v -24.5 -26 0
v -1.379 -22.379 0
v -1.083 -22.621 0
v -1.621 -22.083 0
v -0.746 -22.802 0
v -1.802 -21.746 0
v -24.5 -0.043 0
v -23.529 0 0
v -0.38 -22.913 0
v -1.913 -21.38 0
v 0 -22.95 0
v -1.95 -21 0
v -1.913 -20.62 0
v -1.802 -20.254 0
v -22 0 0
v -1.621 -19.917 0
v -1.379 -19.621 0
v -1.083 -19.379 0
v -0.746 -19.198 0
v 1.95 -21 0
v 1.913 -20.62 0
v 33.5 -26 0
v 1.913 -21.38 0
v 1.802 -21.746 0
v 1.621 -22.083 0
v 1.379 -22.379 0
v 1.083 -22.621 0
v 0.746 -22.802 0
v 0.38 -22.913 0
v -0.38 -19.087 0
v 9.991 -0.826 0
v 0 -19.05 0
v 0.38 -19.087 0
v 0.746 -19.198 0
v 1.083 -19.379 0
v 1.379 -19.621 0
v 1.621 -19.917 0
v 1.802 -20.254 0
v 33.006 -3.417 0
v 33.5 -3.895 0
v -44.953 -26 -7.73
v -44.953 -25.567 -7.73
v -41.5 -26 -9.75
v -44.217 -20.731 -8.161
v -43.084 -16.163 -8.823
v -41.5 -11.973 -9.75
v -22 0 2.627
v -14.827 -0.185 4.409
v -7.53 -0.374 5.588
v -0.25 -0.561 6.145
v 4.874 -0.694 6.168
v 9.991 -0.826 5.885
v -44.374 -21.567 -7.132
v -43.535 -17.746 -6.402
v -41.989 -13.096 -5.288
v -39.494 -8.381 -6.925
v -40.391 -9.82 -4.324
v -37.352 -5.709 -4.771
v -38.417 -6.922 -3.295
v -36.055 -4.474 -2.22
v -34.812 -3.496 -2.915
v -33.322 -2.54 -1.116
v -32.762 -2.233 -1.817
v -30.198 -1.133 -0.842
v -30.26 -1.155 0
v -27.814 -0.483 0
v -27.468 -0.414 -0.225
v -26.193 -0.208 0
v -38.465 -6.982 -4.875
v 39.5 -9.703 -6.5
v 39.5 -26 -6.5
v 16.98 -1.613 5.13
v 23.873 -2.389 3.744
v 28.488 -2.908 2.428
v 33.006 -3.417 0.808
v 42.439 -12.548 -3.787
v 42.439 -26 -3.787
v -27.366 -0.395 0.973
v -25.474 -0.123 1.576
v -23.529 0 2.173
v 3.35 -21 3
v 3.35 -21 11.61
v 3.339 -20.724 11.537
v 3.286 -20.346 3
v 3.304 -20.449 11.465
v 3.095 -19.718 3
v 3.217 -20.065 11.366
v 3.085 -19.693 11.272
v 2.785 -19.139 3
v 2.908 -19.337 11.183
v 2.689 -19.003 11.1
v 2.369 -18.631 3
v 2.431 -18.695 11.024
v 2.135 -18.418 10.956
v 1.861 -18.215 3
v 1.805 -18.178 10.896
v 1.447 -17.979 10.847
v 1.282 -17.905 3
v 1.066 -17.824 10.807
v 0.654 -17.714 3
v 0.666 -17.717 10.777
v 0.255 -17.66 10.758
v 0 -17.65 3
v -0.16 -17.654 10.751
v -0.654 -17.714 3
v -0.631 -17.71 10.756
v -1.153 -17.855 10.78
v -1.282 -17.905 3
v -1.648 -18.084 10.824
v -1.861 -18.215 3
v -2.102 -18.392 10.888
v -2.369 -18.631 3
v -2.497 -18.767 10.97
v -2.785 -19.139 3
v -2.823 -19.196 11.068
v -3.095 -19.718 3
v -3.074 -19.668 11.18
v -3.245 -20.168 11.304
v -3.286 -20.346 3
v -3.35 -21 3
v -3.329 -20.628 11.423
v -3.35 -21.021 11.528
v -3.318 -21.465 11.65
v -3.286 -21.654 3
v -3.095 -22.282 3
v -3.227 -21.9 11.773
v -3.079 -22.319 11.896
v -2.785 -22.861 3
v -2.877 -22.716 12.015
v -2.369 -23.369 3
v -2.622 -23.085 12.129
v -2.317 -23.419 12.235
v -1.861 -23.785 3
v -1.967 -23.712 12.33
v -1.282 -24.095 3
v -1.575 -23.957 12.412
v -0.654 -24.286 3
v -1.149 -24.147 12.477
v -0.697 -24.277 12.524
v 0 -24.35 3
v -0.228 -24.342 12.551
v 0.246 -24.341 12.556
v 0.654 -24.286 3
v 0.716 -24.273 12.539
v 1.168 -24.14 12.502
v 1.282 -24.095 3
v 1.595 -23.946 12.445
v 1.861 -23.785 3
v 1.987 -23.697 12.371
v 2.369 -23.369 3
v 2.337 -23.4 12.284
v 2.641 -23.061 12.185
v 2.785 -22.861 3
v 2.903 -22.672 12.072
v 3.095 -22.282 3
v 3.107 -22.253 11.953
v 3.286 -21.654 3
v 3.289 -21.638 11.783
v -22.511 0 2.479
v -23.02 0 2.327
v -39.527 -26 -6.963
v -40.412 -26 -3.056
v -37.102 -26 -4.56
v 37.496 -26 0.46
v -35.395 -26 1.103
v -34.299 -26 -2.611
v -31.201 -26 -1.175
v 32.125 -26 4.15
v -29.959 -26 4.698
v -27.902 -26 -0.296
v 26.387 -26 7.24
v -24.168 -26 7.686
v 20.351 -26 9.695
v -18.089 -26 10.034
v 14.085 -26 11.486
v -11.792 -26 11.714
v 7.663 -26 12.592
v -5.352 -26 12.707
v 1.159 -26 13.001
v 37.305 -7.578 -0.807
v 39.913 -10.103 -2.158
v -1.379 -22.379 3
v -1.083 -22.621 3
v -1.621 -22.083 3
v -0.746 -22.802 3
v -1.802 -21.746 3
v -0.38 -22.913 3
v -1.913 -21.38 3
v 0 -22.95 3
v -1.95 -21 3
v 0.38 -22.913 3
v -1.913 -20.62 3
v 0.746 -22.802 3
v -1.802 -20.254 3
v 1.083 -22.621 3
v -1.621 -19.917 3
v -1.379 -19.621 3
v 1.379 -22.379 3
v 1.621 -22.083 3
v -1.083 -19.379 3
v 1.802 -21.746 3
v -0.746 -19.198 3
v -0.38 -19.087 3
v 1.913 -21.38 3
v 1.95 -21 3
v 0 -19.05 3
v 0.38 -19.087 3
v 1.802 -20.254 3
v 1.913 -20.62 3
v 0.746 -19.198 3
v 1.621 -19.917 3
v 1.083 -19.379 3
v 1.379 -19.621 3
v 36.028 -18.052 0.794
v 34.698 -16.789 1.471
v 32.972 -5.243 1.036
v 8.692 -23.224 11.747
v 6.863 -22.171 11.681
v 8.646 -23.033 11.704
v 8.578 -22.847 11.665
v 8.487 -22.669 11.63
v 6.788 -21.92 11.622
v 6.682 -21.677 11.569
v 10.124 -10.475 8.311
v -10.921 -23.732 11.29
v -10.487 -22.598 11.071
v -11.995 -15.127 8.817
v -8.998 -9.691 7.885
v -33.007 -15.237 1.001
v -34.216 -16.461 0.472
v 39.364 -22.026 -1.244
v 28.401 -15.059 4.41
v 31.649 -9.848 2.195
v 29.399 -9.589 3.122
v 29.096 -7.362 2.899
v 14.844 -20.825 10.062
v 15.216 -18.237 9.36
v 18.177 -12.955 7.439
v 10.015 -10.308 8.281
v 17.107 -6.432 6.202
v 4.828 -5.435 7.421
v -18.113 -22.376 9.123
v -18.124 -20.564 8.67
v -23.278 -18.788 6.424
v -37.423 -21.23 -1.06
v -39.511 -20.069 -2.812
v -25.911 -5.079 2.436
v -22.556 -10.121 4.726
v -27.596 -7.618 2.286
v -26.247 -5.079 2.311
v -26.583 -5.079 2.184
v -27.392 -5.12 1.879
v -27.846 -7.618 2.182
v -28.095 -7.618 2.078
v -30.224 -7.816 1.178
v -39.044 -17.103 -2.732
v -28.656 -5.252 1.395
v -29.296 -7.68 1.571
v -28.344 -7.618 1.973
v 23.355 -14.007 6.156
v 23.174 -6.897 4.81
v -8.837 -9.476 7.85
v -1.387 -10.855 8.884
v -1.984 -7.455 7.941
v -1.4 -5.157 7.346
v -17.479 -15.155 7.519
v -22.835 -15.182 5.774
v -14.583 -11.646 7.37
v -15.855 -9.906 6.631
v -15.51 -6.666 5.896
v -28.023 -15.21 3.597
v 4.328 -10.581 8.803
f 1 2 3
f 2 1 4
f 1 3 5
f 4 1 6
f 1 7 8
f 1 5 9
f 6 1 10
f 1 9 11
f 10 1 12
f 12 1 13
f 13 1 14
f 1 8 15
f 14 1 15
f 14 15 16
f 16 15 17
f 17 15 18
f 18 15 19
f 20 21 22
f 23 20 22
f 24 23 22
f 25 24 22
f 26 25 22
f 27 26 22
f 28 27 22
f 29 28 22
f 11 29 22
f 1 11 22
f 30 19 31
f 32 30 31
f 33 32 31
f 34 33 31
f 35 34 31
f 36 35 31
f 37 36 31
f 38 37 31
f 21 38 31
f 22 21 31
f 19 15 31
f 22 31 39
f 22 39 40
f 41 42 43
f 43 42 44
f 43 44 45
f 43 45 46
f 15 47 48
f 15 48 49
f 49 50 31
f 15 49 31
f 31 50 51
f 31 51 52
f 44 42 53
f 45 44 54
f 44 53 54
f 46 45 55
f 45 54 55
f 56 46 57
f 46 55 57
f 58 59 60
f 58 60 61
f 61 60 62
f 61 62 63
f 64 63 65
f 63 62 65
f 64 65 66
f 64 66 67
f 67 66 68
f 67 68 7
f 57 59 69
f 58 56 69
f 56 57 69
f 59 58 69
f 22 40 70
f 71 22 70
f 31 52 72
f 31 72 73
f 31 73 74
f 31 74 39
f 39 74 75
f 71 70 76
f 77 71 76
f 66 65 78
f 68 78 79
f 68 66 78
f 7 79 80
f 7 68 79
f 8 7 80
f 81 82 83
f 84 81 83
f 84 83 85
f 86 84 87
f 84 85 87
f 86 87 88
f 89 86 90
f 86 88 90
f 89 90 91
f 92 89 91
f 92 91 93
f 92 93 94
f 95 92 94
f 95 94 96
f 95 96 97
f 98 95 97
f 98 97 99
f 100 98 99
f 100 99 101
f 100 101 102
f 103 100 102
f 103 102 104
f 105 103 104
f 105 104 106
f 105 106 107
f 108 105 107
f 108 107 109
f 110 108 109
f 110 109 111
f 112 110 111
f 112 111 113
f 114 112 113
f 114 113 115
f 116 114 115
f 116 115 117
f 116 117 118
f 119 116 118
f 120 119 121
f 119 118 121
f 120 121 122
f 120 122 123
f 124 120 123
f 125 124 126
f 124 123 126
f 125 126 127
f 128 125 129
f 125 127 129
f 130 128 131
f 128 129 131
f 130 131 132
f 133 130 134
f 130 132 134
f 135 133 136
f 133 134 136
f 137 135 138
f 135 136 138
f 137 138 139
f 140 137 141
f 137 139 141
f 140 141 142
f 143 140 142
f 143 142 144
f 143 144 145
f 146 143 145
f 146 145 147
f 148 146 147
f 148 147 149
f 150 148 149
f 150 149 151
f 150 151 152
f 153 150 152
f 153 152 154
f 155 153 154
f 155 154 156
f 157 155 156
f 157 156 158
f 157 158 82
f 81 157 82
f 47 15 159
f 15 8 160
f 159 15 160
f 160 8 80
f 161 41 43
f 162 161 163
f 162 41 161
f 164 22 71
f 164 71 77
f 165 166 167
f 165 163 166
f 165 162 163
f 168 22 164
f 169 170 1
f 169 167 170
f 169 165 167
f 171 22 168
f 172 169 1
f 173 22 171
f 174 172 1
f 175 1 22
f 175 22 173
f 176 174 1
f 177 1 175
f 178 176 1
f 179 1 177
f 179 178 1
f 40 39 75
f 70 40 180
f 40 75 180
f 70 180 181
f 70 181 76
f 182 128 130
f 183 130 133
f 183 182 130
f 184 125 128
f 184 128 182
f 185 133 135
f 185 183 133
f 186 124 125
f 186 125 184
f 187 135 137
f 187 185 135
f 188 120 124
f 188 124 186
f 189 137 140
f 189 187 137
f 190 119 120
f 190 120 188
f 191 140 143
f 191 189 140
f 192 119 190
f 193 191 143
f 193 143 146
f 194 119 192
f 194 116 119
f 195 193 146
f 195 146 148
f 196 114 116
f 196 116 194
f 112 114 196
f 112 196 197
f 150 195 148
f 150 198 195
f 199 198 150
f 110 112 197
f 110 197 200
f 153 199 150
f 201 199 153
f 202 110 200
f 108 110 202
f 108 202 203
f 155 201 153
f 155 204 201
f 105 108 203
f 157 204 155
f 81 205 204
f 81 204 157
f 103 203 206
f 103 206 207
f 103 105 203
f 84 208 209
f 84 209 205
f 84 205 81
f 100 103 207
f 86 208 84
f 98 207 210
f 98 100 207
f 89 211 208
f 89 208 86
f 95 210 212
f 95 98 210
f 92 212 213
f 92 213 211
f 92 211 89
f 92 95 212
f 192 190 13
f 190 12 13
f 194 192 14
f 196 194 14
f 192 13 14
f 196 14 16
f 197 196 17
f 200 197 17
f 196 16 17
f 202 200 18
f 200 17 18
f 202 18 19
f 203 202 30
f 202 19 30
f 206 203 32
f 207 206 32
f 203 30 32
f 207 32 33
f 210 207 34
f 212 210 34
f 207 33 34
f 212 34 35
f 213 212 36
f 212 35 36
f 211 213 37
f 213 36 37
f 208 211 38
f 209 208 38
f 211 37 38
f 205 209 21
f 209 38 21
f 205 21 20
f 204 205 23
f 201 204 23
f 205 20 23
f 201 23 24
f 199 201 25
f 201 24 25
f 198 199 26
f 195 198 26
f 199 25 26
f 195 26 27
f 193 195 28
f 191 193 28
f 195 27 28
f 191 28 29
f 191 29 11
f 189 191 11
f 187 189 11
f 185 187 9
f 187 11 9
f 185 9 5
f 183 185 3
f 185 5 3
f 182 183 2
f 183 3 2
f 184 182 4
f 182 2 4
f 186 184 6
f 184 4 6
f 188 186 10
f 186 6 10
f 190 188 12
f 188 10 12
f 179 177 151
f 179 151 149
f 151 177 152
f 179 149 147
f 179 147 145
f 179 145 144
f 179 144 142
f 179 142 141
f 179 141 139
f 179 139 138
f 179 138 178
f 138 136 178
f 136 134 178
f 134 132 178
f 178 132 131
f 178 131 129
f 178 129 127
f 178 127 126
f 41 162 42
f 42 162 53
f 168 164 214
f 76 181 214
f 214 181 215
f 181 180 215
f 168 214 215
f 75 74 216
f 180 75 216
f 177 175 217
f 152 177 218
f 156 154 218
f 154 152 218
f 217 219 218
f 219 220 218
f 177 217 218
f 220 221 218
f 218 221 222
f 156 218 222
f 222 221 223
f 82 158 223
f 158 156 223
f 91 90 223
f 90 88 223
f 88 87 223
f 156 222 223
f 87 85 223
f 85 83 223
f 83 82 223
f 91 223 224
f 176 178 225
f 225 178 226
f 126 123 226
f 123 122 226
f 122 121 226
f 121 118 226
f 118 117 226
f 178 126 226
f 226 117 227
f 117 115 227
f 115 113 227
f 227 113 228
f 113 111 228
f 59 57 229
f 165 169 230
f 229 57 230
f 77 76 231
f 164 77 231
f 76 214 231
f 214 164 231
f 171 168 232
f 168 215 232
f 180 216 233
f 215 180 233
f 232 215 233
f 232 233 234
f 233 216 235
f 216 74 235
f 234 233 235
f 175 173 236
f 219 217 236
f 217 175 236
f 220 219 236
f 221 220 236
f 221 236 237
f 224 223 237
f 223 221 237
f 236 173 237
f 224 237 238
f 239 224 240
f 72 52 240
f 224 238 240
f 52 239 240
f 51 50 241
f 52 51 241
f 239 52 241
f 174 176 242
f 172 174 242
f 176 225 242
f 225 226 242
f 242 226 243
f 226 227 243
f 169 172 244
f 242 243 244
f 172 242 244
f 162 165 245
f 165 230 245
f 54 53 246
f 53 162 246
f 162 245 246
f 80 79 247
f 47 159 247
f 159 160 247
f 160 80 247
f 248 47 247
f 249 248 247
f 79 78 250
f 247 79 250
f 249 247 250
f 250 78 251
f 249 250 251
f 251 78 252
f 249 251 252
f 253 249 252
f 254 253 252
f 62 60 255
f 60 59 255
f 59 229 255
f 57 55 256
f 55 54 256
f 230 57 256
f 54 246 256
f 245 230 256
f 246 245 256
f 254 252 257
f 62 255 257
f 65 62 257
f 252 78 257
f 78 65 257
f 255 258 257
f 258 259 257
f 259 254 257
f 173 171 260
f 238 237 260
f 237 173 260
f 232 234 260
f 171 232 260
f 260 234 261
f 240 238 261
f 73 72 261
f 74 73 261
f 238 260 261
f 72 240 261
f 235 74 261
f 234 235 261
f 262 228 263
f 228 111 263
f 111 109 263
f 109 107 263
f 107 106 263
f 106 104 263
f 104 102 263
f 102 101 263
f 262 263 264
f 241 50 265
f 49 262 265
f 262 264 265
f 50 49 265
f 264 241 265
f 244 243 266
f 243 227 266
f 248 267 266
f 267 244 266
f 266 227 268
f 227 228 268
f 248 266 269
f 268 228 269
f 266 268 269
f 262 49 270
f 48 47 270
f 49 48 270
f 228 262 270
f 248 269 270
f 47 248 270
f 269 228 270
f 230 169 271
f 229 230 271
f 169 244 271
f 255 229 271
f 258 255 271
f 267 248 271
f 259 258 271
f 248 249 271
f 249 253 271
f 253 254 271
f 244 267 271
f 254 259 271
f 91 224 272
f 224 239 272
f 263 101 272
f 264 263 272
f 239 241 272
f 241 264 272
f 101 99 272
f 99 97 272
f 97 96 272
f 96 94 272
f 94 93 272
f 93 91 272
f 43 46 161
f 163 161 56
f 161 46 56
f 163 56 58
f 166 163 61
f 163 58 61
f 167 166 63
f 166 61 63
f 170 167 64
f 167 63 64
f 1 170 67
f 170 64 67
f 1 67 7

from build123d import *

# Parameters (mm, degrees)
POCKET010_DEPTH  = 10.5
HOLE_D           = 3.9
HOLE_DEPTH       = 25
HOLE_CBORE_D     = 6.7
HOLE_CBORE_DEPTH = 14
HOLE_TIPS_R      = 1.95


with BuildPart() as part:
    # Sketch022 → AdditiveLoft001 section 0
    with BuildSketch(Plane.XZ.offset(26)):
        with BuildLine():
            Line((-24.5, 0), (33.5, 0))
            Line((33.5, 0), (39.5, -6.5))
            Line((39.5, -6.5), (42.439214, -3.78688))
            ThreePointArc((42.439214, -3.78688), (-2.100464, 12.941774), (-44.952563, -7.730146))
            Line((-44.952563, -7.730146), (-41.5, -9.75))
            ThreePointArc((-24.5, 0), (-34.298756, -2.610502), (-41.5, -9.75))
        make_face()
    # Sketch023 → AdditiveLoft001 section 1
    with BuildSketch(Plane.XZ):
        with BuildLine():
            Line((-24.5, 0), (33.5, 0))
            Line((33.5, 0), (39.5, -6.5))
            Line((39.5, -6.5), (42.439214, -3.78688))
            ThreePointArc((42.439214, -3.78688), (-1.784428, 5.937707), (-44.952563, -7.730146))
            Line((-44.952563, -7.730146), (-41.5, -9.75))
            ThreePointArc((-24.5, 0), (-34.298756, -2.610502), (-41.5, -9.75))
        make_face()
    loft()

    # Sketch024 → Pocket010 (cut, symmetric)
    with BuildSketch(Plane.XY):
        with BuildLine():
            Line((-22, 0), (9.990911, -0.825847))
            Line((9.990911, -0.825847), (33.005764, -3.416537))
            Line((33.005764, -3.416537), (43.190086, -13.274679))
            Line((43.190086, -13.274679), (43.190086, 17.224566))
            Line((43.190086, 17.224566), (-48.844296, 17.224566))
            Line((-48.844296, 17.224566), (-48.844296, -33.398815))
            Line((-48.844296, -33.398815), (-45, -33.398815))
            Line((-45, -33.398815), (-45, -26))
            add(Edge.make_bspline(
                [(-45, -26), (-42.180007, 0.520948), (-22, 0)],
                knots=[-21.613822, -21.613822, -21.613822, 11.787032, 11.787032, 11.787032], degree=2))
        make_face()
    extrude(amount=POCKET010_DEPTH, both=True, mode=Mode.SUBTRACT)

    # Hole
    with Locations(Plane.XY.offset(17)):
        with Locations((0, -21)):
            CounterBoreHole(HOLE_D / 2, HOLE_CBORE_D / 2, HOLE_CBORE_DEPTH, depth=HOLE_DEPTH)

    # Hole tips → Hole tip 1 section 0
    with BuildSketch(Plane.XY.offset(-8), mode=Mode.PRIVATE) as hole_tip_1_s0:
        with Locations((0, -21)):
            Circle(HOLE_TIPS_R)
    loft([hole_tip_1_s0.sketch, Vertex(0, -21, -9.171678)], mode=Mode.SUBTRACT)


solid = part.part
